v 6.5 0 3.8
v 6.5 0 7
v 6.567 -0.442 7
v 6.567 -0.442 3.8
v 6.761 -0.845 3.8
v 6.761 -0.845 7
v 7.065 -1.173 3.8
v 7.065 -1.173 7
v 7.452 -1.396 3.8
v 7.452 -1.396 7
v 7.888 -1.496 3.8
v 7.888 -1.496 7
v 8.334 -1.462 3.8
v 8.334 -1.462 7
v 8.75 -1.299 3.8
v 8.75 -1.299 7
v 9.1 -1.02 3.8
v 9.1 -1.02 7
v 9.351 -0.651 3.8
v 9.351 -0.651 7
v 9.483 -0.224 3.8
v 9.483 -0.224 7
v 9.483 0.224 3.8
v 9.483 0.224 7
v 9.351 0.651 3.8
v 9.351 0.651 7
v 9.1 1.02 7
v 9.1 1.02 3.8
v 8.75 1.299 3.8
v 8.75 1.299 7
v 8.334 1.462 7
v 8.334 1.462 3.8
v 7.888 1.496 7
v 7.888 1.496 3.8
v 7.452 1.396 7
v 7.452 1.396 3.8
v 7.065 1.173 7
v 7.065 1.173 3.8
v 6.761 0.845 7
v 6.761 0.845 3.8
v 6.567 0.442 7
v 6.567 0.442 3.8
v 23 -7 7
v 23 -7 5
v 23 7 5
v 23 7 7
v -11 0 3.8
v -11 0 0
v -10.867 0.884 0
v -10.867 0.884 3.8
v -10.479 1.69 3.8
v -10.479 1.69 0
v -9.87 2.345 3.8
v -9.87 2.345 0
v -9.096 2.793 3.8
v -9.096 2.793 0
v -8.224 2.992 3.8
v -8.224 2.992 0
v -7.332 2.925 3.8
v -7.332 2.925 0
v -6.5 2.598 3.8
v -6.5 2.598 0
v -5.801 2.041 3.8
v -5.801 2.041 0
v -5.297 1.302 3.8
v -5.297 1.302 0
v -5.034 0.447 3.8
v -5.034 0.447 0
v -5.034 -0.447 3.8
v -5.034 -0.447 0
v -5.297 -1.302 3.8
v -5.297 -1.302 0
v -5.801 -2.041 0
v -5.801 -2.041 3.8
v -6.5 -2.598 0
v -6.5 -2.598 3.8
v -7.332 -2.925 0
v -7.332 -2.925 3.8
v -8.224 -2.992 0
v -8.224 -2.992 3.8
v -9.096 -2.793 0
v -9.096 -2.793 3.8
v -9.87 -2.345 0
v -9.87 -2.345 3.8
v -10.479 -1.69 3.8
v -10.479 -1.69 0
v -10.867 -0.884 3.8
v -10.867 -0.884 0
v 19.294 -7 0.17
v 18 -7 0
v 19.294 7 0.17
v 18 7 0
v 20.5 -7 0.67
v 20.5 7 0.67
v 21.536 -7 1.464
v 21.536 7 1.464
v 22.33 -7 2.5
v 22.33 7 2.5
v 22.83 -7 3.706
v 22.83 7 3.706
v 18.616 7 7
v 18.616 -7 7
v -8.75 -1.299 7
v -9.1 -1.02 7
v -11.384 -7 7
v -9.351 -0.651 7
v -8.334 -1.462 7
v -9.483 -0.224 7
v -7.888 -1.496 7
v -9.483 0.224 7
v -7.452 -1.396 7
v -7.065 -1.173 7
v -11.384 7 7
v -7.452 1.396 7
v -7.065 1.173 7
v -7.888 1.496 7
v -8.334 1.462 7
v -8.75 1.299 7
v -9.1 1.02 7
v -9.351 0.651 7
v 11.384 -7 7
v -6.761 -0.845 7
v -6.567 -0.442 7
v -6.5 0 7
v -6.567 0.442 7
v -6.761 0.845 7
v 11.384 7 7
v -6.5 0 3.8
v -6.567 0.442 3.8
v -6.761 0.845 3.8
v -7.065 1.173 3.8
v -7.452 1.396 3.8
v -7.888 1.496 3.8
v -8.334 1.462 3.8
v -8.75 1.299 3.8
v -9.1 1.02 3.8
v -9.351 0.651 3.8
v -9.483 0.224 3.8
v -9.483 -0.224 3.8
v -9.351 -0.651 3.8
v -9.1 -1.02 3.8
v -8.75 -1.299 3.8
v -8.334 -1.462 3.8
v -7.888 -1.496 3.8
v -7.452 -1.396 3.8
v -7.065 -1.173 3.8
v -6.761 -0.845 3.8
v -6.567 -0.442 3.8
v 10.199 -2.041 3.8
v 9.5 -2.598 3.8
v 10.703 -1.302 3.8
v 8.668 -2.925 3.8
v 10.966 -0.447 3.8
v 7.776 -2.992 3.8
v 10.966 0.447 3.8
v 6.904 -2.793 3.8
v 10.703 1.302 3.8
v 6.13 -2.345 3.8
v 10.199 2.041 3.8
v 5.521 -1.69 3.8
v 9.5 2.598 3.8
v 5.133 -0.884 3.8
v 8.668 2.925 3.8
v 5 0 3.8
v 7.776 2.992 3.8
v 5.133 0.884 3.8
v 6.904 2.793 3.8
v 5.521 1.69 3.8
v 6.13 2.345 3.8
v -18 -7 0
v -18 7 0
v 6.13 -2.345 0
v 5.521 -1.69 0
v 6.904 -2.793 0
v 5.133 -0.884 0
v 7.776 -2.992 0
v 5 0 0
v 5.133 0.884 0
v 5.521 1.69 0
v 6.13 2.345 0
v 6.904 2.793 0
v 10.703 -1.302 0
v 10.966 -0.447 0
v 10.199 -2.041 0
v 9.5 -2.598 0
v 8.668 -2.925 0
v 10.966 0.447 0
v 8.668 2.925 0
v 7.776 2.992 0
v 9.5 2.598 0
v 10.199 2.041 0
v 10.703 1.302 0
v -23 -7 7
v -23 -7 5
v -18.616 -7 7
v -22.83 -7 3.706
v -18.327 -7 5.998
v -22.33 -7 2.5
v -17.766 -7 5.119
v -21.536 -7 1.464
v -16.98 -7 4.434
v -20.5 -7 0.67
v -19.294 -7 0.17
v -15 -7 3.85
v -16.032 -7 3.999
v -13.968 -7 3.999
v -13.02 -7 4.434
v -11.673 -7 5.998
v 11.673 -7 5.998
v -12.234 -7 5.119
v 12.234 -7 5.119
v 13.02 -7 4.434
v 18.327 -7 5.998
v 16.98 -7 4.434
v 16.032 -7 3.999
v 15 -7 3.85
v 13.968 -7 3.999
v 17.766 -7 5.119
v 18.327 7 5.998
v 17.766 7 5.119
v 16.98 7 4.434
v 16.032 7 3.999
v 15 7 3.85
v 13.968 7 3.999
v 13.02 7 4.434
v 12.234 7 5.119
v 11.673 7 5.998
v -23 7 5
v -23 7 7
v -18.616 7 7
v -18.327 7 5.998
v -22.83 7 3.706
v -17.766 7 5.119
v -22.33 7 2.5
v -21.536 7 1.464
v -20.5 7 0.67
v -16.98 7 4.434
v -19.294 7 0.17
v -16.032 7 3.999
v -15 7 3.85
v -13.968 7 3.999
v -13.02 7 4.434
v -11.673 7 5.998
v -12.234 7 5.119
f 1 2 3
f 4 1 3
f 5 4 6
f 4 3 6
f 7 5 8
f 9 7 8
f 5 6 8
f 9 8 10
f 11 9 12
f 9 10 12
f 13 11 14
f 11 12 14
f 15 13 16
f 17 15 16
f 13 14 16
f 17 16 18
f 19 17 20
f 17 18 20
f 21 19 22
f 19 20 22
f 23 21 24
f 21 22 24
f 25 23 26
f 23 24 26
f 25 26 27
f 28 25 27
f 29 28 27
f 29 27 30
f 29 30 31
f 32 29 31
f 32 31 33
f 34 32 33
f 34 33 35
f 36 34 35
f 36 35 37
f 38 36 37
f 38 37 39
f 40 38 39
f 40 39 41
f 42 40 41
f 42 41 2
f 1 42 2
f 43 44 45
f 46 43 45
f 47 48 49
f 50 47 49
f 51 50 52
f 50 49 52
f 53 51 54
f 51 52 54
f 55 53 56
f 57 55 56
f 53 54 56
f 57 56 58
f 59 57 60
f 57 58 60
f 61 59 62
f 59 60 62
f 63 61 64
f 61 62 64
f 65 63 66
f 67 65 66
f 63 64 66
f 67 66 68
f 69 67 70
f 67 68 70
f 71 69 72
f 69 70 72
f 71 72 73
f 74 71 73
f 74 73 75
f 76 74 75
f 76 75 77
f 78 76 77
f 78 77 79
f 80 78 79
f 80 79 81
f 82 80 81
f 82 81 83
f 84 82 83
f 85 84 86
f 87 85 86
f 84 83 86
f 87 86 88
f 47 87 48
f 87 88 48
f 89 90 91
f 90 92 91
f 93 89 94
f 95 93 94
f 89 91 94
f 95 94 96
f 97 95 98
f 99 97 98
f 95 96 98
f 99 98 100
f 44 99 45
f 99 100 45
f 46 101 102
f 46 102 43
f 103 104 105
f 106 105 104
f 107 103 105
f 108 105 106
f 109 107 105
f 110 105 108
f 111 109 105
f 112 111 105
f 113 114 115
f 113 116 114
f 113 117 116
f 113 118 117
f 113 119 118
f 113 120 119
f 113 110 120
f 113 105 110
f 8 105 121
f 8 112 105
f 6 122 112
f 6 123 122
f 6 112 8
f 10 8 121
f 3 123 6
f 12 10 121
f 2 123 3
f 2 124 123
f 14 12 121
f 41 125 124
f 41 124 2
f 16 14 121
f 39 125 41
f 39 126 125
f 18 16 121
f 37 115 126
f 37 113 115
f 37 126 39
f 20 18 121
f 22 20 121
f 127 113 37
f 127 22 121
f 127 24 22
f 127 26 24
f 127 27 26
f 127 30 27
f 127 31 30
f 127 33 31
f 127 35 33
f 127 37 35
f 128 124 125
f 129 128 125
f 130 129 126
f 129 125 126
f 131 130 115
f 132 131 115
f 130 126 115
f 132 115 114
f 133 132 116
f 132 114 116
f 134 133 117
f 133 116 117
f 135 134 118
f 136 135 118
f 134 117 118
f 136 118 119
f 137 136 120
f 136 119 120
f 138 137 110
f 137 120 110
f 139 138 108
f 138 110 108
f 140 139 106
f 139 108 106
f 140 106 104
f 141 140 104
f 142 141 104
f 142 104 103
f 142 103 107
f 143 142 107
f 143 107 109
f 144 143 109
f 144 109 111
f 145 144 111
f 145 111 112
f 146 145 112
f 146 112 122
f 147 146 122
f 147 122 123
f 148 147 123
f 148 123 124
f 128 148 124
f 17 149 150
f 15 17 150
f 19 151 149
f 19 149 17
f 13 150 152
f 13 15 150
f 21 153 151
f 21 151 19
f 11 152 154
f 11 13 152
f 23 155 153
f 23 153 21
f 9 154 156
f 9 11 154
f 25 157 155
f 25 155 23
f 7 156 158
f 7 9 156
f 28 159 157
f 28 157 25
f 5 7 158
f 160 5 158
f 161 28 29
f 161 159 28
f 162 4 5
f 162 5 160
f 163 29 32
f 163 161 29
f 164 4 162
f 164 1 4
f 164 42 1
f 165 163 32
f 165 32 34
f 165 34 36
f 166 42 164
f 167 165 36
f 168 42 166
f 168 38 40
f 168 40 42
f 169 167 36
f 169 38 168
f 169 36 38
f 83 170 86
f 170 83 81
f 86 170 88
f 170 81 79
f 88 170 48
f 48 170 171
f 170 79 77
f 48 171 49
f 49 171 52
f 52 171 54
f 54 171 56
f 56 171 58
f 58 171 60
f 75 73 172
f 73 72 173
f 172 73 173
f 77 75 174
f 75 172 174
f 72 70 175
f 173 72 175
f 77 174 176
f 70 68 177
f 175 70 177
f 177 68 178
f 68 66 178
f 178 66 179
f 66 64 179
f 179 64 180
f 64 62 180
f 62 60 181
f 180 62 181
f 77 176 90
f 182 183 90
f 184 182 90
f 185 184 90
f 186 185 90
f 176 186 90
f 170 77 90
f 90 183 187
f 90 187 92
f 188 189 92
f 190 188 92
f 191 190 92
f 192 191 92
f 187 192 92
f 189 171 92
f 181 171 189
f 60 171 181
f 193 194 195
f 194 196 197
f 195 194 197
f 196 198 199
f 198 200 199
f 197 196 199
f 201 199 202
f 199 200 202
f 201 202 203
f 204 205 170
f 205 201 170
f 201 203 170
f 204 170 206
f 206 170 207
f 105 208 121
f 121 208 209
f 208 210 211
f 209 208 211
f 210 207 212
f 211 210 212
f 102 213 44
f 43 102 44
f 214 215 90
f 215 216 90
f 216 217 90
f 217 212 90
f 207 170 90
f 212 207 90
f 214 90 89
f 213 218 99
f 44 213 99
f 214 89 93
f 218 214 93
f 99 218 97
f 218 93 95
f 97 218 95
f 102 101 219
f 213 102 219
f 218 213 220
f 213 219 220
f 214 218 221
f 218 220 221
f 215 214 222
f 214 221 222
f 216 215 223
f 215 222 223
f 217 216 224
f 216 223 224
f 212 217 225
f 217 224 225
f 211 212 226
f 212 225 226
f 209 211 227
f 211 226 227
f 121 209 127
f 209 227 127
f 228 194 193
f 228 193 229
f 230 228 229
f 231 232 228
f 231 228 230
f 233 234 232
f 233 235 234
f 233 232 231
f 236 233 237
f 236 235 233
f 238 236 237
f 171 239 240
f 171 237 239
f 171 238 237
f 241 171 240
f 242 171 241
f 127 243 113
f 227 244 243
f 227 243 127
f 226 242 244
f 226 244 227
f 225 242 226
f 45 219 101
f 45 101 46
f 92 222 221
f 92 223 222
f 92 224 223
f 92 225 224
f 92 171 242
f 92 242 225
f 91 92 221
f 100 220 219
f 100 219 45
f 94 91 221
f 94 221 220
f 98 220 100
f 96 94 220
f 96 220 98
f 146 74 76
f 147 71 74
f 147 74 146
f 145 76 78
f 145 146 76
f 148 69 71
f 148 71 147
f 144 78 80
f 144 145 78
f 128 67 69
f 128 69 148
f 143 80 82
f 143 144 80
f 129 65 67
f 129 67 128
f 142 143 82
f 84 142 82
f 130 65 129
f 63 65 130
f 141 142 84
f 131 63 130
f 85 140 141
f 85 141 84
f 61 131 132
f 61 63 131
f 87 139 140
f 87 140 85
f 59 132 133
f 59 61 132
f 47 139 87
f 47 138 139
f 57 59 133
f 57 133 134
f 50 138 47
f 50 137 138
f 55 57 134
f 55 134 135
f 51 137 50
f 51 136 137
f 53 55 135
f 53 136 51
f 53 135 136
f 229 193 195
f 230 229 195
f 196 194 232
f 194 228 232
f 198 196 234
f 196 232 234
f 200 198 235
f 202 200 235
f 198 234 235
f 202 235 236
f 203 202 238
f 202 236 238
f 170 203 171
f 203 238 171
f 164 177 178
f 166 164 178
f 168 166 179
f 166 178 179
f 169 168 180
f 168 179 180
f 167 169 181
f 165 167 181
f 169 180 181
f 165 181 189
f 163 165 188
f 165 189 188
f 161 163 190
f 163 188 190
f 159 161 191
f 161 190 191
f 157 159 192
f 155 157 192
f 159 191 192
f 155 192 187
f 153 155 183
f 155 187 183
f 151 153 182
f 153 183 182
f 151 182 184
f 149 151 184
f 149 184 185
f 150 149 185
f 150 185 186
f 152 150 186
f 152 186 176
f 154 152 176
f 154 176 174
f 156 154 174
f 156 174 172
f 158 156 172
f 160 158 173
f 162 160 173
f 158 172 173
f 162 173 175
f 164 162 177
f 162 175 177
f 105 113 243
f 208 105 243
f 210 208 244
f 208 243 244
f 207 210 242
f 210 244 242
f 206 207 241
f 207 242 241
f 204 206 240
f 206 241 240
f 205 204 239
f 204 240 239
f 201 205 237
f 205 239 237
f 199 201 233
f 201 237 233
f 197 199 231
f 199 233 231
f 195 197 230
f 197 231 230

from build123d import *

# Parameters (mm, degrees)
SKETCH_1_W          = 46
SKETCH_1_H          = 14
EXTRUDE_1_DEPTH     = 7
CUT_EXTRUDE_1_REACH = 27.04
SKETCH_2_R          = 1.5
CUT_EXTRUDE_2_REACH = 29.821
SKETCH_3_R          = 3.65
SKETCH_4_R          = 3
CUT_EXTRUDE_3_DEPTH = 3.8
FILLET_1_R          = 5


with BuildPart() as part:
    # Эскиз1 → Бобышка-Вытянуть1 (new body)
    with BuildSketch(Plane.XY):
        Rectangle(SKETCH_1_W, SKETCH_1_H)
    extrude(amount=EXTRUDE_1_DEPTH)

    # Эскиз2 → Вырез-Вытянуть1 (cut, up to next)
    with BuildSketch(Plane.XY.offset(7), mode=Mode.PRIVATE) as cut_extrude_1_sk1:
        with Locations((-8, 0)):
            Circle(SKETCH_2_R)
    cut_extrude_1_tool1 = extrude(cut_extrude_1_sk1.sketch, amount=-CUT_EXTRUDE_1_REACH, mode=Mode.PRIVATE) & part.part
    # Эскиз2 → Вырез-Вытянуть1 (cut, up to next)
    with BuildSketch(Plane.XY.offset(7), mode=Mode.PRIVATE) as cut_extrude_1_sk2:
        with Locations(Location((8, 0, 0), (0, 0, 180))):
            Circle(SKETCH_2_R)
    cut_extrude_1_tool2 = extrude(cut_extrude_1_sk2.sketch, amount=-CUT_EXTRUDE_1_REACH, mode=Mode.PRIVATE) & part.part
    add(cut_extrude_1_tool1.solids().sort_by_distance((-8, 0, 7))[0], mode=Mode.SUBTRACT)
    add(cut_extrude_1_tool2.solids().sort_by_distance((8, 0, 7))[0], mode=Mode.SUBTRACT)

    # Эскиз3 → Вырез-Вытянуть2 (cut, up to next)
    with BuildSketch(Plane(origin=(0, 7, 0), x_dir=(1, 0, 0), z_dir=(0, 1, 0)), mode=Mode.PRIVATE) as cut_extrude_2_sk1:
        with Locations((-15, -7.5)):
            Circle(SKETCH_3_R)
    cut_extrude_2_tool1 = extrude(cut_extrude_2_sk1.sketch, amount=-CUT_EXTRUDE_2_REACH, mode=Mode.PRIVATE) & part.part
    # Эскиз3 → Вырез-Вытянуть2 (cut, up to next)
    with BuildSketch(Plane(origin=(0, 7, 0), x_dir=(1, 0, 0), z_dir=(0, 1, 0)), mode=Mode.PRIVATE) as cut_extrude_2_sk2:
        with Locations((15, -7.5)):
            Circle(SKETCH_3_R)
    cut_extrude_2_tool2 = extrude(cut_extrude_2_sk2.sketch, amount=-CUT_EXTRUDE_2_REACH, mode=Mode.PRIVATE) & part.part
    add(cut_extrude_2_tool1.solids().sort_by_distance((-15, 7, 7.5))[0], mode=Mode.SUBTRACT)
    add(cut_extrude_2_tool2.solids().sort_by_distance((15, 7, 7.5))[0], mode=Mode.SUBTRACT)

    # Эскиз4 → Вырез-Вытянуть3 (cut)
    with BuildSketch(Plane(origin=(0, 0, 0), x_dir=(-1, 0, 0), z_dir=(0, 0, -1))):
        with Locations((-8, 0)):
            Circle(SKETCH_4_R)
        with Locations((8, 0)):
            Circle(SKETCH_4_R)
    extrude(amount=-CUT_EXTRUDE_3_DEPTH, mode=Mode.SUBTRACT)

    # Скругление1
    fillet_1_edges = [part.edges().sort_by_distance(p)[0] for p in [
        (-23, 0, 0),
        (23, 0, 0),
    ]]
    fillet(fillet_1_edges, radius=FILLET_1_R)


solid = part.part
